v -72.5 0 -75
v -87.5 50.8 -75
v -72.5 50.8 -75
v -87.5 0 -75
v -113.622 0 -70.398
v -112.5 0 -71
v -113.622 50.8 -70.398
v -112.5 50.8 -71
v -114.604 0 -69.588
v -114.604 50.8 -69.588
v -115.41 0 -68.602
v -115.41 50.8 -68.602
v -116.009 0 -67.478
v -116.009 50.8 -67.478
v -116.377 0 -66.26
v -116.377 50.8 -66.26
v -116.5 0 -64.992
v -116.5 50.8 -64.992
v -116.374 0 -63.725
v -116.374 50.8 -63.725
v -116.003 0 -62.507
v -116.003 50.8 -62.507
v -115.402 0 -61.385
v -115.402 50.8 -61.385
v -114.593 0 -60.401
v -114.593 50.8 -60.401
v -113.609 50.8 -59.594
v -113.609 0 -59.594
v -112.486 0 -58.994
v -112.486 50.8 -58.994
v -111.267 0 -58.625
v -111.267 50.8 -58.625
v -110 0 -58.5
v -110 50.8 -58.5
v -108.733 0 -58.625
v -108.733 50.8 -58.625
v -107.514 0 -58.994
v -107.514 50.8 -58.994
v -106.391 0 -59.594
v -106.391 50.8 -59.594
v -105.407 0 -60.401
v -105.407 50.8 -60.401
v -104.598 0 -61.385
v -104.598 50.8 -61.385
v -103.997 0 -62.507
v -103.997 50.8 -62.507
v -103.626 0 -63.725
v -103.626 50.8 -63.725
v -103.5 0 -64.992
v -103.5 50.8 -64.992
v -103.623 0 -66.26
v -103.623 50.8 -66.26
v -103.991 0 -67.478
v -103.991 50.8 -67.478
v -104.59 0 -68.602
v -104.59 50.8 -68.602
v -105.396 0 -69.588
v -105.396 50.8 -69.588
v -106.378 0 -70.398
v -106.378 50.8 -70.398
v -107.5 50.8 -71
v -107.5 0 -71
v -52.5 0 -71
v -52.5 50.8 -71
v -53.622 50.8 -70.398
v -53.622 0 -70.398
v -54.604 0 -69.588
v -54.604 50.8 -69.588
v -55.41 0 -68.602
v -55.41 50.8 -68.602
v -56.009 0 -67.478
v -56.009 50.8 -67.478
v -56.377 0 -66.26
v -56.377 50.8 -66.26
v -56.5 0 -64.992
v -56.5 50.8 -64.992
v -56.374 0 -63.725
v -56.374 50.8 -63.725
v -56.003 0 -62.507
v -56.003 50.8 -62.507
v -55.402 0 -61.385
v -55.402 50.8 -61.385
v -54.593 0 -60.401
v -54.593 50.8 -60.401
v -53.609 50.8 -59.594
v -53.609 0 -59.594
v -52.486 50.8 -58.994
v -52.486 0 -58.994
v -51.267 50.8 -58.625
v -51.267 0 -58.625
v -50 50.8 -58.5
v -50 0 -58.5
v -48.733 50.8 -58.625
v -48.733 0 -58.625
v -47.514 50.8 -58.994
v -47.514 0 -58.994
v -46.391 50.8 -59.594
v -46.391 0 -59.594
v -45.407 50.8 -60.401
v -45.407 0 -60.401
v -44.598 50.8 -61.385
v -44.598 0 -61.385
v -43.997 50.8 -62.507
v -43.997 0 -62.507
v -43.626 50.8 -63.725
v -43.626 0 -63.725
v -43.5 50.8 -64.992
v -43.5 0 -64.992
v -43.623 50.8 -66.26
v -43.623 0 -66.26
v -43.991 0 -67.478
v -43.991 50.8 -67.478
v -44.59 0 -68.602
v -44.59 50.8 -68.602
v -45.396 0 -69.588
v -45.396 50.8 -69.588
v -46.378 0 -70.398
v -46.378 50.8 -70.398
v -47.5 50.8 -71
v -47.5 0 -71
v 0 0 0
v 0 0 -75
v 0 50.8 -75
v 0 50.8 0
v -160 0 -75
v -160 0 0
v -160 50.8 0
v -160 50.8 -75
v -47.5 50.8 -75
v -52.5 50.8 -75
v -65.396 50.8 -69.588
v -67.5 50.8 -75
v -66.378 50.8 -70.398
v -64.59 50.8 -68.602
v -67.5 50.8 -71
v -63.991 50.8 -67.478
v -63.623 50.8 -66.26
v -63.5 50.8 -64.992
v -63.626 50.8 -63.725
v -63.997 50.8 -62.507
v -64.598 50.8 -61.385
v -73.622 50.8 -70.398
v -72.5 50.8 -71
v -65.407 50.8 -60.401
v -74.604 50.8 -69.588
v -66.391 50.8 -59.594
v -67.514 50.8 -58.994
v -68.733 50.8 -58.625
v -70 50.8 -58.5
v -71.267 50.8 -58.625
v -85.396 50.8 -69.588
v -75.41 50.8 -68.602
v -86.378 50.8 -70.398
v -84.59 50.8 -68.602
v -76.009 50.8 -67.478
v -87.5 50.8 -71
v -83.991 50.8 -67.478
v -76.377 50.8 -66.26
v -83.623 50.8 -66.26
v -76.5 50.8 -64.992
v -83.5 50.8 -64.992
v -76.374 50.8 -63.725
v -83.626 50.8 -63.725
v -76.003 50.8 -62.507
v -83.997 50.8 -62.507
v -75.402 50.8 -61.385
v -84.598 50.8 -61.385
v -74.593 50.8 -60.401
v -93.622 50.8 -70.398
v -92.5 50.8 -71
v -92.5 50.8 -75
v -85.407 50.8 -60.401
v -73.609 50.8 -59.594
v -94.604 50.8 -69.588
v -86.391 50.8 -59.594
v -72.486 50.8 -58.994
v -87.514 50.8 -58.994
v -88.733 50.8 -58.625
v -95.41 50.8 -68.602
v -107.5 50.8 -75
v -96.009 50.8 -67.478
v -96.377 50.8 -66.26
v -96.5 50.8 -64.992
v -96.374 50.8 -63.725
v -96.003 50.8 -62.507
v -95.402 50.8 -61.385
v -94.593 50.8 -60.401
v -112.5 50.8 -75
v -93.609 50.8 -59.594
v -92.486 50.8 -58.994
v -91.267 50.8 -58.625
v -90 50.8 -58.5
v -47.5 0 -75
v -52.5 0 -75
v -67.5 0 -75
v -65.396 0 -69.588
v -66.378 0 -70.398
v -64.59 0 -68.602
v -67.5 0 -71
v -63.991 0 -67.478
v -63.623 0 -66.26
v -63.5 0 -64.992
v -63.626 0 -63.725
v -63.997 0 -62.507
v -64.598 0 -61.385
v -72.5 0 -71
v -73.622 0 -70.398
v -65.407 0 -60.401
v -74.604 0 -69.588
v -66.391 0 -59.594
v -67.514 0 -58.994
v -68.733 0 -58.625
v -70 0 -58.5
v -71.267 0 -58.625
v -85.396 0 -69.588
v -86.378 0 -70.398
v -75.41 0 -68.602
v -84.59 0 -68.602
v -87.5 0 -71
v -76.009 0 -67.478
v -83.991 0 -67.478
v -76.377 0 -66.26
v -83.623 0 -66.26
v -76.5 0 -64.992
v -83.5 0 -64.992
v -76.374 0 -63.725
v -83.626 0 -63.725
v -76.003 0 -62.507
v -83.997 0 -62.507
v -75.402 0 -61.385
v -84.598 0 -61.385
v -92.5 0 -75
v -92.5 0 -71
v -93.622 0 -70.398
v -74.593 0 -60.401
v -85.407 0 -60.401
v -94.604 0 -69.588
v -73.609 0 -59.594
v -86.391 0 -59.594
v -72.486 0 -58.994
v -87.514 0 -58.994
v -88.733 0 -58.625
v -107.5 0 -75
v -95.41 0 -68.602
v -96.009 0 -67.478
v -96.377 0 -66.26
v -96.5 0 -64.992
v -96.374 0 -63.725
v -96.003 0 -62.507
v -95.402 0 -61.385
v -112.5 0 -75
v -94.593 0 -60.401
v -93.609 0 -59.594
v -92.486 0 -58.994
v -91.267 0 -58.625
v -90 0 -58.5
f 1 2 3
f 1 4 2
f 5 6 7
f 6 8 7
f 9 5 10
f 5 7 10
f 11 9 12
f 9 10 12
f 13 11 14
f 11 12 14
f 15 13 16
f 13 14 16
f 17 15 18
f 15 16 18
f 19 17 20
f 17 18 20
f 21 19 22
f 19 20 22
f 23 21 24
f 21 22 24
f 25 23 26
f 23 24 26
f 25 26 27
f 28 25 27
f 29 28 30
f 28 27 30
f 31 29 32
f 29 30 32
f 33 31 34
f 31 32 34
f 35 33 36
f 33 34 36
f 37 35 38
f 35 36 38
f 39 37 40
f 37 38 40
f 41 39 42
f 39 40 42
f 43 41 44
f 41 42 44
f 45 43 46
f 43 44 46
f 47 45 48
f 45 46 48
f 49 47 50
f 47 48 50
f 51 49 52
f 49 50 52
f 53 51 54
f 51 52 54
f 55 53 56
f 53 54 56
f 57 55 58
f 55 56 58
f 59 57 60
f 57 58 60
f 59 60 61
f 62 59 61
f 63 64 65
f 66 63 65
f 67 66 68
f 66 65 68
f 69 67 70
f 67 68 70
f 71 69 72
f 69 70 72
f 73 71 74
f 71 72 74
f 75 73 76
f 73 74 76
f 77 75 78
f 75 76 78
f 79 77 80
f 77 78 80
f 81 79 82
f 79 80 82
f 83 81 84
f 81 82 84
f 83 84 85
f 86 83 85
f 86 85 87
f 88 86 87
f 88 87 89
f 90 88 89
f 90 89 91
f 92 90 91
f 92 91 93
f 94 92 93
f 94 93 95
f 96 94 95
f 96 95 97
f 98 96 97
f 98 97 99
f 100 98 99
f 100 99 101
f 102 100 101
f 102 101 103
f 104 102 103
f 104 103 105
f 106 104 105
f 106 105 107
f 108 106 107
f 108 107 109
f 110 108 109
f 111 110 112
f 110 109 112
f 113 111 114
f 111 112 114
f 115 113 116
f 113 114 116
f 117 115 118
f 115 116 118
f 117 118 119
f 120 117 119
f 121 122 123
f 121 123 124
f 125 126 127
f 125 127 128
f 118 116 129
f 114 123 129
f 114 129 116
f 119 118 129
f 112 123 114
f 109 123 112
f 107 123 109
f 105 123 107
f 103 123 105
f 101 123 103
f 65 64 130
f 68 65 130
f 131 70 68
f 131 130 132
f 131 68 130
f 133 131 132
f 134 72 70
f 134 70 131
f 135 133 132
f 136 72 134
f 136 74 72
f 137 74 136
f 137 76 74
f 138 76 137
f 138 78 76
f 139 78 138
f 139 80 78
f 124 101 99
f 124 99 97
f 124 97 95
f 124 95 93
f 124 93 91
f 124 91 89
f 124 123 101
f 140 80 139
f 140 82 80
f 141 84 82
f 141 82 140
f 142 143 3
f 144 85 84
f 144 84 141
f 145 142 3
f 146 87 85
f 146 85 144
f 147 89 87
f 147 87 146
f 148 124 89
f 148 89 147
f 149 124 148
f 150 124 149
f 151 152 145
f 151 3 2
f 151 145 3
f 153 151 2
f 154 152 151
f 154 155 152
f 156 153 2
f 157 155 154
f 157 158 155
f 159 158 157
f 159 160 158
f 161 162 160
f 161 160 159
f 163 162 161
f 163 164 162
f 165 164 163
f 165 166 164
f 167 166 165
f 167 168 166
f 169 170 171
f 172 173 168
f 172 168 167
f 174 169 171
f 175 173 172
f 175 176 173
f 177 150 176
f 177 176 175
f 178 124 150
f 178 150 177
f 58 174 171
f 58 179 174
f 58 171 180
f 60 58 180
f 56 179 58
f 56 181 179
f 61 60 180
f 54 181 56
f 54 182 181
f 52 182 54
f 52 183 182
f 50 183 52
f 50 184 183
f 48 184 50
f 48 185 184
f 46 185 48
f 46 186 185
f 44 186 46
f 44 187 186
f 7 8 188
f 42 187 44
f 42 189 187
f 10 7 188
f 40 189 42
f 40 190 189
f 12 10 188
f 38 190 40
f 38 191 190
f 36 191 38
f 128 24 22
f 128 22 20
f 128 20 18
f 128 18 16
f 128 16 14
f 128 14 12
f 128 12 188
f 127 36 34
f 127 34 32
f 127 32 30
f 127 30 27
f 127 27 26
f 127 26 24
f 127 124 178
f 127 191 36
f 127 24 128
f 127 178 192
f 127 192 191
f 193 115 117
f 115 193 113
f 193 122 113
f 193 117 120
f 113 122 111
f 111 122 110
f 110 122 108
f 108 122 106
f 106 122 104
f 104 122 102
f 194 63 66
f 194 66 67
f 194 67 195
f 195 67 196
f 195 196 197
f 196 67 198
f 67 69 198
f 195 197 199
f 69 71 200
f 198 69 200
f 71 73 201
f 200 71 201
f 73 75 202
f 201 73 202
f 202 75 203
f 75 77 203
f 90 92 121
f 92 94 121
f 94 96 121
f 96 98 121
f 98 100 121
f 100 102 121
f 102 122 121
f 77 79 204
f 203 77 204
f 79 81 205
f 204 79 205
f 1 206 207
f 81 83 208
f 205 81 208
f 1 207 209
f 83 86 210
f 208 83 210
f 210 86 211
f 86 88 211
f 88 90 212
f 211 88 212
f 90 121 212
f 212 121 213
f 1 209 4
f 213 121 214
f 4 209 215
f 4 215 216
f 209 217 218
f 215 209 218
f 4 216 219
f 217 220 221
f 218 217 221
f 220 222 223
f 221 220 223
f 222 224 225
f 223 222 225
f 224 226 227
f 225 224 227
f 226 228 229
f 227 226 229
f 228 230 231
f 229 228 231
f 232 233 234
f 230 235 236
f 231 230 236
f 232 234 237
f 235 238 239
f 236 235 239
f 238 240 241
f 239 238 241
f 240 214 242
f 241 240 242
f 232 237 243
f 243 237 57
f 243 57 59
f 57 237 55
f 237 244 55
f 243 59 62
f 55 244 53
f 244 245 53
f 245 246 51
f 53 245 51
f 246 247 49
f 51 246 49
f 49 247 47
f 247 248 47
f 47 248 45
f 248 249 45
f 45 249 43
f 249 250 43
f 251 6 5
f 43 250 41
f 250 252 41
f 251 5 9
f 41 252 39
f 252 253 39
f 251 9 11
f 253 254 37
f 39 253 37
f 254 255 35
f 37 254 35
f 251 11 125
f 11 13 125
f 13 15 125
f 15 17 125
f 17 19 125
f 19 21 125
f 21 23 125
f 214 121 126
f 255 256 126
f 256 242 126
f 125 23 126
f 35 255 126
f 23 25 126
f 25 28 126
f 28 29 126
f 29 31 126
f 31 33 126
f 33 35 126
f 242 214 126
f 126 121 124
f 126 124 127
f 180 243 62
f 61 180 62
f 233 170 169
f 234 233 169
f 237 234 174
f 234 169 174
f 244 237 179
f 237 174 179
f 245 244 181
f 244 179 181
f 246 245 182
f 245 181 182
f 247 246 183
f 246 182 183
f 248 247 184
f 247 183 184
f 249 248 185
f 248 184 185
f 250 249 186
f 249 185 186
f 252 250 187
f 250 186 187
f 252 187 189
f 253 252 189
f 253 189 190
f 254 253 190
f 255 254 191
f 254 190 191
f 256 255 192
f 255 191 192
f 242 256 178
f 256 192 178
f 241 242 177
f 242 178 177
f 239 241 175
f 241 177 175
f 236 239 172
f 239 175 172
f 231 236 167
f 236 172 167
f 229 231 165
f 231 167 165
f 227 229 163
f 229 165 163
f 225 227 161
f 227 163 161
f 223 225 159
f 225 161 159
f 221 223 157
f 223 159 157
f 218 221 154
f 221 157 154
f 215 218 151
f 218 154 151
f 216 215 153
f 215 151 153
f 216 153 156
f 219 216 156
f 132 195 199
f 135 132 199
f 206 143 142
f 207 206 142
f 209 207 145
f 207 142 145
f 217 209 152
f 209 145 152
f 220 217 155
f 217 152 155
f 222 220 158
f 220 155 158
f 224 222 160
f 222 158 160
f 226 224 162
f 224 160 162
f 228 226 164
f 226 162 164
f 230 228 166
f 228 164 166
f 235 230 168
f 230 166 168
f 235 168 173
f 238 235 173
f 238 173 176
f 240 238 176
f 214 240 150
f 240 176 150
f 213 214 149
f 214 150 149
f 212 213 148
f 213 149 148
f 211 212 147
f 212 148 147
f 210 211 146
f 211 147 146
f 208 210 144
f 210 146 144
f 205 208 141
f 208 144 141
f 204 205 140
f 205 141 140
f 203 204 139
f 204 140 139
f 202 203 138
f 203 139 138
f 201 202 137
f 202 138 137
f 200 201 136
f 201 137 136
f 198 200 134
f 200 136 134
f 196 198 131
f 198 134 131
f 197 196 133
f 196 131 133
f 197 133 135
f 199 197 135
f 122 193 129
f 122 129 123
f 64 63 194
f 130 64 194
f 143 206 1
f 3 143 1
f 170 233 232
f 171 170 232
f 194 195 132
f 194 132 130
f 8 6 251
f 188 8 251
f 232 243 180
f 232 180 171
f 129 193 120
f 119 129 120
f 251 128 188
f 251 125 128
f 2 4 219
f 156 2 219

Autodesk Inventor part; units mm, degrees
ref_plane "YZ Plane" through (0, 0, 0) normal (1, 0, 0) x (0, 1, 0)
ref_plane "XZ Plane" through (0, 0, 0) normal (0, 1, 0) x (-1, 0, 0)
ref_plane "XY Plane" through (0, 0, 0) normal (0, 0, 1) x (1, 0, 0)
sketch "Sketch1" plane through (0, 0, 0) normal (0, 1, 0) x (-1, 0, 0)
  line L0 (0, 0) -> (160, 0)
  line L1 (160, 0) -> (160, -75)
  line L2 (160, -75) -> (0, -75)
  line L3 (0, -75) -> (0, 0)
  dimension "d0" = 160
  dimension "d1" = 75
extrude "Extrusion1" add sketch "Sketch1" along normal blind 50.8
sketch "Sketch2" plane through (0, 50.8, 0) normal (0, 1, 0) x (1, 0, 0)
  circle A0 centre (-110, 65) radius 6.5
  line L0 (0, 75) -> (-160, 75) projected
  line L1 (-160, 75) -> (-160, 0) projected
  circle A1 centre (-90, 65) radius 6.5
  circle A2 centre (-70, 65) radius 6.5
  circle A3 centre (-50, 65) radius 6.5
  point P0 (0, 0)
  dimension "d4" = 13
  dimension "d5" = 10
  dimension "d6" = 50
  dimension "d12" = 20
extrude "Extrusion2" cut sketch "Sketch2" against normal blind 50.8
sketch "Sketch3" plane through (0, 50.8, 0) normal (0, 1, 0) x (1, 0, 0)
  line L0 (0, 75) -> (-160, 75) projected
  line L1 (-112.5, 75) -> (-107.5, 75)
  line L2 (-107.5, 75) -> (-107.5, 70)
  line L3 (-107.5, 70) -> (-112.5, 70)
  line L4 (-112.5, 70) -> (-112.5, 75)
  circle A0 centre (-110, 65) radius 6.5 projected
  line L5 (-87.5, 75) -> (-87.5, 70)
  line L6 (-87.5, 70) -> (-92.5, 70)
  line L7 (-92.5, 70) -> (-92.5, 75)
  line L8 (-92.5, 75) -> (-87.5, 75)
  line L9 (-67.5, 75) -> (-67.5, 70)
  line L10 (-67.5, 70) -> (-72.5, 70)
  line L11 (-72.5, 70) -> (-72.5, 75)
  line L12 (-72.5, 75) -> (-67.5, 75)
  line L13 (-47.5, 75) -> (-47.5, 70)
  line L14 (-47.5, 70) -> (-52.5, 70)
  line L15 (-52.5, 70) -> (-52.5, 75)
  line L16 (-52.5, 75) -> (-47.5, 75)
  point P0 (0, 0)
  dimension "d16" = 5
  dimension "d17" = 5
  dimension "d18" = 2.5
  dimension "d24" = 20
extrude "Extrusion3" cut sketch "Sketch3" against normal blind 50.8 contours L13 L14 L15 L0 | L2 A0 L4 L0 | L5 L6 L7 L0 | L9 L10 L11 L0 | L2 L3 L4 A0 picked at (-110, 70.5)
properties part number "Lateral"
